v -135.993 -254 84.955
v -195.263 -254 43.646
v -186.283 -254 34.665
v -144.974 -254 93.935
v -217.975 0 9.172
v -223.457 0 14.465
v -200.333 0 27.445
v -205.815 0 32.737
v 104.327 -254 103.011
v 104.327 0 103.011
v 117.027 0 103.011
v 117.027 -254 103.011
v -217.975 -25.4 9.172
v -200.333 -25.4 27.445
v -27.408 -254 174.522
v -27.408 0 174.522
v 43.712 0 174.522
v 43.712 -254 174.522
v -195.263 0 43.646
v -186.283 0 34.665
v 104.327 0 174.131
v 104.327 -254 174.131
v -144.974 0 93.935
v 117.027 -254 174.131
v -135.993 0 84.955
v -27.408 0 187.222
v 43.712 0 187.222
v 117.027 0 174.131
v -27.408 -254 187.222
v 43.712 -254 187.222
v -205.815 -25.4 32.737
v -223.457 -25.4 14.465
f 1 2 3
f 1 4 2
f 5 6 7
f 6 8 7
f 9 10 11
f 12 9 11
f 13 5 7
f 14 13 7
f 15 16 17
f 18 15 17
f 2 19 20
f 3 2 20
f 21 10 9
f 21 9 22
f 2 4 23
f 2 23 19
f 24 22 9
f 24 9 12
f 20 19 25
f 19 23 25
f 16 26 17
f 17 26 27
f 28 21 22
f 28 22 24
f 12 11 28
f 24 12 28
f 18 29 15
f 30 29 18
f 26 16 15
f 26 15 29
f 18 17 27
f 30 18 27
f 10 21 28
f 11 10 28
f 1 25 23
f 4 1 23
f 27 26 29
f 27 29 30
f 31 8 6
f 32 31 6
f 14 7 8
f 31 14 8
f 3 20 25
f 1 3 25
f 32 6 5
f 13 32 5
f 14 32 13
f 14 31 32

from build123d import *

# Parameters (mm, degrees)
F0_W     = 71.12
F0_H     = 12.7
F0_W_2   = 12.7
F0_H_2   = 71.12
F1_DEPTH = 254
F3_DEPTH = 25.4


with BuildPart() as f1:
    # F0 (on Front) → F1 (new body)
    with BuildSketch(Plane.XZ):
        with Locations((8.151879, 180.87158)):
            Rectangle(F0_W, F0_H)
        with Locations((110.676953, 138.570622)):
            Rectangle(F0_W_2, F0_H_2)
        Polygon((-195.263058, 43.645673), (-186.282802, 34.665416), (-135.993367, 84.954851), (-144.973624, 93.935107), align=None)
    extrude(amount=F1_DEPTH)


with BuildPart() as f3:
    # F2 (on Front) → F3 (new body)
    with BuildSketch(Plane.XZ):
        Polygon((-223.457229, 14.464707), (-217.975392, 9.171896), (-200.332686, 27.444688), (-205.814524, 32.7375), align=None)
    extrude(amount=F3_DEPTH)


solid = Compound([f1.part, f3.part])
